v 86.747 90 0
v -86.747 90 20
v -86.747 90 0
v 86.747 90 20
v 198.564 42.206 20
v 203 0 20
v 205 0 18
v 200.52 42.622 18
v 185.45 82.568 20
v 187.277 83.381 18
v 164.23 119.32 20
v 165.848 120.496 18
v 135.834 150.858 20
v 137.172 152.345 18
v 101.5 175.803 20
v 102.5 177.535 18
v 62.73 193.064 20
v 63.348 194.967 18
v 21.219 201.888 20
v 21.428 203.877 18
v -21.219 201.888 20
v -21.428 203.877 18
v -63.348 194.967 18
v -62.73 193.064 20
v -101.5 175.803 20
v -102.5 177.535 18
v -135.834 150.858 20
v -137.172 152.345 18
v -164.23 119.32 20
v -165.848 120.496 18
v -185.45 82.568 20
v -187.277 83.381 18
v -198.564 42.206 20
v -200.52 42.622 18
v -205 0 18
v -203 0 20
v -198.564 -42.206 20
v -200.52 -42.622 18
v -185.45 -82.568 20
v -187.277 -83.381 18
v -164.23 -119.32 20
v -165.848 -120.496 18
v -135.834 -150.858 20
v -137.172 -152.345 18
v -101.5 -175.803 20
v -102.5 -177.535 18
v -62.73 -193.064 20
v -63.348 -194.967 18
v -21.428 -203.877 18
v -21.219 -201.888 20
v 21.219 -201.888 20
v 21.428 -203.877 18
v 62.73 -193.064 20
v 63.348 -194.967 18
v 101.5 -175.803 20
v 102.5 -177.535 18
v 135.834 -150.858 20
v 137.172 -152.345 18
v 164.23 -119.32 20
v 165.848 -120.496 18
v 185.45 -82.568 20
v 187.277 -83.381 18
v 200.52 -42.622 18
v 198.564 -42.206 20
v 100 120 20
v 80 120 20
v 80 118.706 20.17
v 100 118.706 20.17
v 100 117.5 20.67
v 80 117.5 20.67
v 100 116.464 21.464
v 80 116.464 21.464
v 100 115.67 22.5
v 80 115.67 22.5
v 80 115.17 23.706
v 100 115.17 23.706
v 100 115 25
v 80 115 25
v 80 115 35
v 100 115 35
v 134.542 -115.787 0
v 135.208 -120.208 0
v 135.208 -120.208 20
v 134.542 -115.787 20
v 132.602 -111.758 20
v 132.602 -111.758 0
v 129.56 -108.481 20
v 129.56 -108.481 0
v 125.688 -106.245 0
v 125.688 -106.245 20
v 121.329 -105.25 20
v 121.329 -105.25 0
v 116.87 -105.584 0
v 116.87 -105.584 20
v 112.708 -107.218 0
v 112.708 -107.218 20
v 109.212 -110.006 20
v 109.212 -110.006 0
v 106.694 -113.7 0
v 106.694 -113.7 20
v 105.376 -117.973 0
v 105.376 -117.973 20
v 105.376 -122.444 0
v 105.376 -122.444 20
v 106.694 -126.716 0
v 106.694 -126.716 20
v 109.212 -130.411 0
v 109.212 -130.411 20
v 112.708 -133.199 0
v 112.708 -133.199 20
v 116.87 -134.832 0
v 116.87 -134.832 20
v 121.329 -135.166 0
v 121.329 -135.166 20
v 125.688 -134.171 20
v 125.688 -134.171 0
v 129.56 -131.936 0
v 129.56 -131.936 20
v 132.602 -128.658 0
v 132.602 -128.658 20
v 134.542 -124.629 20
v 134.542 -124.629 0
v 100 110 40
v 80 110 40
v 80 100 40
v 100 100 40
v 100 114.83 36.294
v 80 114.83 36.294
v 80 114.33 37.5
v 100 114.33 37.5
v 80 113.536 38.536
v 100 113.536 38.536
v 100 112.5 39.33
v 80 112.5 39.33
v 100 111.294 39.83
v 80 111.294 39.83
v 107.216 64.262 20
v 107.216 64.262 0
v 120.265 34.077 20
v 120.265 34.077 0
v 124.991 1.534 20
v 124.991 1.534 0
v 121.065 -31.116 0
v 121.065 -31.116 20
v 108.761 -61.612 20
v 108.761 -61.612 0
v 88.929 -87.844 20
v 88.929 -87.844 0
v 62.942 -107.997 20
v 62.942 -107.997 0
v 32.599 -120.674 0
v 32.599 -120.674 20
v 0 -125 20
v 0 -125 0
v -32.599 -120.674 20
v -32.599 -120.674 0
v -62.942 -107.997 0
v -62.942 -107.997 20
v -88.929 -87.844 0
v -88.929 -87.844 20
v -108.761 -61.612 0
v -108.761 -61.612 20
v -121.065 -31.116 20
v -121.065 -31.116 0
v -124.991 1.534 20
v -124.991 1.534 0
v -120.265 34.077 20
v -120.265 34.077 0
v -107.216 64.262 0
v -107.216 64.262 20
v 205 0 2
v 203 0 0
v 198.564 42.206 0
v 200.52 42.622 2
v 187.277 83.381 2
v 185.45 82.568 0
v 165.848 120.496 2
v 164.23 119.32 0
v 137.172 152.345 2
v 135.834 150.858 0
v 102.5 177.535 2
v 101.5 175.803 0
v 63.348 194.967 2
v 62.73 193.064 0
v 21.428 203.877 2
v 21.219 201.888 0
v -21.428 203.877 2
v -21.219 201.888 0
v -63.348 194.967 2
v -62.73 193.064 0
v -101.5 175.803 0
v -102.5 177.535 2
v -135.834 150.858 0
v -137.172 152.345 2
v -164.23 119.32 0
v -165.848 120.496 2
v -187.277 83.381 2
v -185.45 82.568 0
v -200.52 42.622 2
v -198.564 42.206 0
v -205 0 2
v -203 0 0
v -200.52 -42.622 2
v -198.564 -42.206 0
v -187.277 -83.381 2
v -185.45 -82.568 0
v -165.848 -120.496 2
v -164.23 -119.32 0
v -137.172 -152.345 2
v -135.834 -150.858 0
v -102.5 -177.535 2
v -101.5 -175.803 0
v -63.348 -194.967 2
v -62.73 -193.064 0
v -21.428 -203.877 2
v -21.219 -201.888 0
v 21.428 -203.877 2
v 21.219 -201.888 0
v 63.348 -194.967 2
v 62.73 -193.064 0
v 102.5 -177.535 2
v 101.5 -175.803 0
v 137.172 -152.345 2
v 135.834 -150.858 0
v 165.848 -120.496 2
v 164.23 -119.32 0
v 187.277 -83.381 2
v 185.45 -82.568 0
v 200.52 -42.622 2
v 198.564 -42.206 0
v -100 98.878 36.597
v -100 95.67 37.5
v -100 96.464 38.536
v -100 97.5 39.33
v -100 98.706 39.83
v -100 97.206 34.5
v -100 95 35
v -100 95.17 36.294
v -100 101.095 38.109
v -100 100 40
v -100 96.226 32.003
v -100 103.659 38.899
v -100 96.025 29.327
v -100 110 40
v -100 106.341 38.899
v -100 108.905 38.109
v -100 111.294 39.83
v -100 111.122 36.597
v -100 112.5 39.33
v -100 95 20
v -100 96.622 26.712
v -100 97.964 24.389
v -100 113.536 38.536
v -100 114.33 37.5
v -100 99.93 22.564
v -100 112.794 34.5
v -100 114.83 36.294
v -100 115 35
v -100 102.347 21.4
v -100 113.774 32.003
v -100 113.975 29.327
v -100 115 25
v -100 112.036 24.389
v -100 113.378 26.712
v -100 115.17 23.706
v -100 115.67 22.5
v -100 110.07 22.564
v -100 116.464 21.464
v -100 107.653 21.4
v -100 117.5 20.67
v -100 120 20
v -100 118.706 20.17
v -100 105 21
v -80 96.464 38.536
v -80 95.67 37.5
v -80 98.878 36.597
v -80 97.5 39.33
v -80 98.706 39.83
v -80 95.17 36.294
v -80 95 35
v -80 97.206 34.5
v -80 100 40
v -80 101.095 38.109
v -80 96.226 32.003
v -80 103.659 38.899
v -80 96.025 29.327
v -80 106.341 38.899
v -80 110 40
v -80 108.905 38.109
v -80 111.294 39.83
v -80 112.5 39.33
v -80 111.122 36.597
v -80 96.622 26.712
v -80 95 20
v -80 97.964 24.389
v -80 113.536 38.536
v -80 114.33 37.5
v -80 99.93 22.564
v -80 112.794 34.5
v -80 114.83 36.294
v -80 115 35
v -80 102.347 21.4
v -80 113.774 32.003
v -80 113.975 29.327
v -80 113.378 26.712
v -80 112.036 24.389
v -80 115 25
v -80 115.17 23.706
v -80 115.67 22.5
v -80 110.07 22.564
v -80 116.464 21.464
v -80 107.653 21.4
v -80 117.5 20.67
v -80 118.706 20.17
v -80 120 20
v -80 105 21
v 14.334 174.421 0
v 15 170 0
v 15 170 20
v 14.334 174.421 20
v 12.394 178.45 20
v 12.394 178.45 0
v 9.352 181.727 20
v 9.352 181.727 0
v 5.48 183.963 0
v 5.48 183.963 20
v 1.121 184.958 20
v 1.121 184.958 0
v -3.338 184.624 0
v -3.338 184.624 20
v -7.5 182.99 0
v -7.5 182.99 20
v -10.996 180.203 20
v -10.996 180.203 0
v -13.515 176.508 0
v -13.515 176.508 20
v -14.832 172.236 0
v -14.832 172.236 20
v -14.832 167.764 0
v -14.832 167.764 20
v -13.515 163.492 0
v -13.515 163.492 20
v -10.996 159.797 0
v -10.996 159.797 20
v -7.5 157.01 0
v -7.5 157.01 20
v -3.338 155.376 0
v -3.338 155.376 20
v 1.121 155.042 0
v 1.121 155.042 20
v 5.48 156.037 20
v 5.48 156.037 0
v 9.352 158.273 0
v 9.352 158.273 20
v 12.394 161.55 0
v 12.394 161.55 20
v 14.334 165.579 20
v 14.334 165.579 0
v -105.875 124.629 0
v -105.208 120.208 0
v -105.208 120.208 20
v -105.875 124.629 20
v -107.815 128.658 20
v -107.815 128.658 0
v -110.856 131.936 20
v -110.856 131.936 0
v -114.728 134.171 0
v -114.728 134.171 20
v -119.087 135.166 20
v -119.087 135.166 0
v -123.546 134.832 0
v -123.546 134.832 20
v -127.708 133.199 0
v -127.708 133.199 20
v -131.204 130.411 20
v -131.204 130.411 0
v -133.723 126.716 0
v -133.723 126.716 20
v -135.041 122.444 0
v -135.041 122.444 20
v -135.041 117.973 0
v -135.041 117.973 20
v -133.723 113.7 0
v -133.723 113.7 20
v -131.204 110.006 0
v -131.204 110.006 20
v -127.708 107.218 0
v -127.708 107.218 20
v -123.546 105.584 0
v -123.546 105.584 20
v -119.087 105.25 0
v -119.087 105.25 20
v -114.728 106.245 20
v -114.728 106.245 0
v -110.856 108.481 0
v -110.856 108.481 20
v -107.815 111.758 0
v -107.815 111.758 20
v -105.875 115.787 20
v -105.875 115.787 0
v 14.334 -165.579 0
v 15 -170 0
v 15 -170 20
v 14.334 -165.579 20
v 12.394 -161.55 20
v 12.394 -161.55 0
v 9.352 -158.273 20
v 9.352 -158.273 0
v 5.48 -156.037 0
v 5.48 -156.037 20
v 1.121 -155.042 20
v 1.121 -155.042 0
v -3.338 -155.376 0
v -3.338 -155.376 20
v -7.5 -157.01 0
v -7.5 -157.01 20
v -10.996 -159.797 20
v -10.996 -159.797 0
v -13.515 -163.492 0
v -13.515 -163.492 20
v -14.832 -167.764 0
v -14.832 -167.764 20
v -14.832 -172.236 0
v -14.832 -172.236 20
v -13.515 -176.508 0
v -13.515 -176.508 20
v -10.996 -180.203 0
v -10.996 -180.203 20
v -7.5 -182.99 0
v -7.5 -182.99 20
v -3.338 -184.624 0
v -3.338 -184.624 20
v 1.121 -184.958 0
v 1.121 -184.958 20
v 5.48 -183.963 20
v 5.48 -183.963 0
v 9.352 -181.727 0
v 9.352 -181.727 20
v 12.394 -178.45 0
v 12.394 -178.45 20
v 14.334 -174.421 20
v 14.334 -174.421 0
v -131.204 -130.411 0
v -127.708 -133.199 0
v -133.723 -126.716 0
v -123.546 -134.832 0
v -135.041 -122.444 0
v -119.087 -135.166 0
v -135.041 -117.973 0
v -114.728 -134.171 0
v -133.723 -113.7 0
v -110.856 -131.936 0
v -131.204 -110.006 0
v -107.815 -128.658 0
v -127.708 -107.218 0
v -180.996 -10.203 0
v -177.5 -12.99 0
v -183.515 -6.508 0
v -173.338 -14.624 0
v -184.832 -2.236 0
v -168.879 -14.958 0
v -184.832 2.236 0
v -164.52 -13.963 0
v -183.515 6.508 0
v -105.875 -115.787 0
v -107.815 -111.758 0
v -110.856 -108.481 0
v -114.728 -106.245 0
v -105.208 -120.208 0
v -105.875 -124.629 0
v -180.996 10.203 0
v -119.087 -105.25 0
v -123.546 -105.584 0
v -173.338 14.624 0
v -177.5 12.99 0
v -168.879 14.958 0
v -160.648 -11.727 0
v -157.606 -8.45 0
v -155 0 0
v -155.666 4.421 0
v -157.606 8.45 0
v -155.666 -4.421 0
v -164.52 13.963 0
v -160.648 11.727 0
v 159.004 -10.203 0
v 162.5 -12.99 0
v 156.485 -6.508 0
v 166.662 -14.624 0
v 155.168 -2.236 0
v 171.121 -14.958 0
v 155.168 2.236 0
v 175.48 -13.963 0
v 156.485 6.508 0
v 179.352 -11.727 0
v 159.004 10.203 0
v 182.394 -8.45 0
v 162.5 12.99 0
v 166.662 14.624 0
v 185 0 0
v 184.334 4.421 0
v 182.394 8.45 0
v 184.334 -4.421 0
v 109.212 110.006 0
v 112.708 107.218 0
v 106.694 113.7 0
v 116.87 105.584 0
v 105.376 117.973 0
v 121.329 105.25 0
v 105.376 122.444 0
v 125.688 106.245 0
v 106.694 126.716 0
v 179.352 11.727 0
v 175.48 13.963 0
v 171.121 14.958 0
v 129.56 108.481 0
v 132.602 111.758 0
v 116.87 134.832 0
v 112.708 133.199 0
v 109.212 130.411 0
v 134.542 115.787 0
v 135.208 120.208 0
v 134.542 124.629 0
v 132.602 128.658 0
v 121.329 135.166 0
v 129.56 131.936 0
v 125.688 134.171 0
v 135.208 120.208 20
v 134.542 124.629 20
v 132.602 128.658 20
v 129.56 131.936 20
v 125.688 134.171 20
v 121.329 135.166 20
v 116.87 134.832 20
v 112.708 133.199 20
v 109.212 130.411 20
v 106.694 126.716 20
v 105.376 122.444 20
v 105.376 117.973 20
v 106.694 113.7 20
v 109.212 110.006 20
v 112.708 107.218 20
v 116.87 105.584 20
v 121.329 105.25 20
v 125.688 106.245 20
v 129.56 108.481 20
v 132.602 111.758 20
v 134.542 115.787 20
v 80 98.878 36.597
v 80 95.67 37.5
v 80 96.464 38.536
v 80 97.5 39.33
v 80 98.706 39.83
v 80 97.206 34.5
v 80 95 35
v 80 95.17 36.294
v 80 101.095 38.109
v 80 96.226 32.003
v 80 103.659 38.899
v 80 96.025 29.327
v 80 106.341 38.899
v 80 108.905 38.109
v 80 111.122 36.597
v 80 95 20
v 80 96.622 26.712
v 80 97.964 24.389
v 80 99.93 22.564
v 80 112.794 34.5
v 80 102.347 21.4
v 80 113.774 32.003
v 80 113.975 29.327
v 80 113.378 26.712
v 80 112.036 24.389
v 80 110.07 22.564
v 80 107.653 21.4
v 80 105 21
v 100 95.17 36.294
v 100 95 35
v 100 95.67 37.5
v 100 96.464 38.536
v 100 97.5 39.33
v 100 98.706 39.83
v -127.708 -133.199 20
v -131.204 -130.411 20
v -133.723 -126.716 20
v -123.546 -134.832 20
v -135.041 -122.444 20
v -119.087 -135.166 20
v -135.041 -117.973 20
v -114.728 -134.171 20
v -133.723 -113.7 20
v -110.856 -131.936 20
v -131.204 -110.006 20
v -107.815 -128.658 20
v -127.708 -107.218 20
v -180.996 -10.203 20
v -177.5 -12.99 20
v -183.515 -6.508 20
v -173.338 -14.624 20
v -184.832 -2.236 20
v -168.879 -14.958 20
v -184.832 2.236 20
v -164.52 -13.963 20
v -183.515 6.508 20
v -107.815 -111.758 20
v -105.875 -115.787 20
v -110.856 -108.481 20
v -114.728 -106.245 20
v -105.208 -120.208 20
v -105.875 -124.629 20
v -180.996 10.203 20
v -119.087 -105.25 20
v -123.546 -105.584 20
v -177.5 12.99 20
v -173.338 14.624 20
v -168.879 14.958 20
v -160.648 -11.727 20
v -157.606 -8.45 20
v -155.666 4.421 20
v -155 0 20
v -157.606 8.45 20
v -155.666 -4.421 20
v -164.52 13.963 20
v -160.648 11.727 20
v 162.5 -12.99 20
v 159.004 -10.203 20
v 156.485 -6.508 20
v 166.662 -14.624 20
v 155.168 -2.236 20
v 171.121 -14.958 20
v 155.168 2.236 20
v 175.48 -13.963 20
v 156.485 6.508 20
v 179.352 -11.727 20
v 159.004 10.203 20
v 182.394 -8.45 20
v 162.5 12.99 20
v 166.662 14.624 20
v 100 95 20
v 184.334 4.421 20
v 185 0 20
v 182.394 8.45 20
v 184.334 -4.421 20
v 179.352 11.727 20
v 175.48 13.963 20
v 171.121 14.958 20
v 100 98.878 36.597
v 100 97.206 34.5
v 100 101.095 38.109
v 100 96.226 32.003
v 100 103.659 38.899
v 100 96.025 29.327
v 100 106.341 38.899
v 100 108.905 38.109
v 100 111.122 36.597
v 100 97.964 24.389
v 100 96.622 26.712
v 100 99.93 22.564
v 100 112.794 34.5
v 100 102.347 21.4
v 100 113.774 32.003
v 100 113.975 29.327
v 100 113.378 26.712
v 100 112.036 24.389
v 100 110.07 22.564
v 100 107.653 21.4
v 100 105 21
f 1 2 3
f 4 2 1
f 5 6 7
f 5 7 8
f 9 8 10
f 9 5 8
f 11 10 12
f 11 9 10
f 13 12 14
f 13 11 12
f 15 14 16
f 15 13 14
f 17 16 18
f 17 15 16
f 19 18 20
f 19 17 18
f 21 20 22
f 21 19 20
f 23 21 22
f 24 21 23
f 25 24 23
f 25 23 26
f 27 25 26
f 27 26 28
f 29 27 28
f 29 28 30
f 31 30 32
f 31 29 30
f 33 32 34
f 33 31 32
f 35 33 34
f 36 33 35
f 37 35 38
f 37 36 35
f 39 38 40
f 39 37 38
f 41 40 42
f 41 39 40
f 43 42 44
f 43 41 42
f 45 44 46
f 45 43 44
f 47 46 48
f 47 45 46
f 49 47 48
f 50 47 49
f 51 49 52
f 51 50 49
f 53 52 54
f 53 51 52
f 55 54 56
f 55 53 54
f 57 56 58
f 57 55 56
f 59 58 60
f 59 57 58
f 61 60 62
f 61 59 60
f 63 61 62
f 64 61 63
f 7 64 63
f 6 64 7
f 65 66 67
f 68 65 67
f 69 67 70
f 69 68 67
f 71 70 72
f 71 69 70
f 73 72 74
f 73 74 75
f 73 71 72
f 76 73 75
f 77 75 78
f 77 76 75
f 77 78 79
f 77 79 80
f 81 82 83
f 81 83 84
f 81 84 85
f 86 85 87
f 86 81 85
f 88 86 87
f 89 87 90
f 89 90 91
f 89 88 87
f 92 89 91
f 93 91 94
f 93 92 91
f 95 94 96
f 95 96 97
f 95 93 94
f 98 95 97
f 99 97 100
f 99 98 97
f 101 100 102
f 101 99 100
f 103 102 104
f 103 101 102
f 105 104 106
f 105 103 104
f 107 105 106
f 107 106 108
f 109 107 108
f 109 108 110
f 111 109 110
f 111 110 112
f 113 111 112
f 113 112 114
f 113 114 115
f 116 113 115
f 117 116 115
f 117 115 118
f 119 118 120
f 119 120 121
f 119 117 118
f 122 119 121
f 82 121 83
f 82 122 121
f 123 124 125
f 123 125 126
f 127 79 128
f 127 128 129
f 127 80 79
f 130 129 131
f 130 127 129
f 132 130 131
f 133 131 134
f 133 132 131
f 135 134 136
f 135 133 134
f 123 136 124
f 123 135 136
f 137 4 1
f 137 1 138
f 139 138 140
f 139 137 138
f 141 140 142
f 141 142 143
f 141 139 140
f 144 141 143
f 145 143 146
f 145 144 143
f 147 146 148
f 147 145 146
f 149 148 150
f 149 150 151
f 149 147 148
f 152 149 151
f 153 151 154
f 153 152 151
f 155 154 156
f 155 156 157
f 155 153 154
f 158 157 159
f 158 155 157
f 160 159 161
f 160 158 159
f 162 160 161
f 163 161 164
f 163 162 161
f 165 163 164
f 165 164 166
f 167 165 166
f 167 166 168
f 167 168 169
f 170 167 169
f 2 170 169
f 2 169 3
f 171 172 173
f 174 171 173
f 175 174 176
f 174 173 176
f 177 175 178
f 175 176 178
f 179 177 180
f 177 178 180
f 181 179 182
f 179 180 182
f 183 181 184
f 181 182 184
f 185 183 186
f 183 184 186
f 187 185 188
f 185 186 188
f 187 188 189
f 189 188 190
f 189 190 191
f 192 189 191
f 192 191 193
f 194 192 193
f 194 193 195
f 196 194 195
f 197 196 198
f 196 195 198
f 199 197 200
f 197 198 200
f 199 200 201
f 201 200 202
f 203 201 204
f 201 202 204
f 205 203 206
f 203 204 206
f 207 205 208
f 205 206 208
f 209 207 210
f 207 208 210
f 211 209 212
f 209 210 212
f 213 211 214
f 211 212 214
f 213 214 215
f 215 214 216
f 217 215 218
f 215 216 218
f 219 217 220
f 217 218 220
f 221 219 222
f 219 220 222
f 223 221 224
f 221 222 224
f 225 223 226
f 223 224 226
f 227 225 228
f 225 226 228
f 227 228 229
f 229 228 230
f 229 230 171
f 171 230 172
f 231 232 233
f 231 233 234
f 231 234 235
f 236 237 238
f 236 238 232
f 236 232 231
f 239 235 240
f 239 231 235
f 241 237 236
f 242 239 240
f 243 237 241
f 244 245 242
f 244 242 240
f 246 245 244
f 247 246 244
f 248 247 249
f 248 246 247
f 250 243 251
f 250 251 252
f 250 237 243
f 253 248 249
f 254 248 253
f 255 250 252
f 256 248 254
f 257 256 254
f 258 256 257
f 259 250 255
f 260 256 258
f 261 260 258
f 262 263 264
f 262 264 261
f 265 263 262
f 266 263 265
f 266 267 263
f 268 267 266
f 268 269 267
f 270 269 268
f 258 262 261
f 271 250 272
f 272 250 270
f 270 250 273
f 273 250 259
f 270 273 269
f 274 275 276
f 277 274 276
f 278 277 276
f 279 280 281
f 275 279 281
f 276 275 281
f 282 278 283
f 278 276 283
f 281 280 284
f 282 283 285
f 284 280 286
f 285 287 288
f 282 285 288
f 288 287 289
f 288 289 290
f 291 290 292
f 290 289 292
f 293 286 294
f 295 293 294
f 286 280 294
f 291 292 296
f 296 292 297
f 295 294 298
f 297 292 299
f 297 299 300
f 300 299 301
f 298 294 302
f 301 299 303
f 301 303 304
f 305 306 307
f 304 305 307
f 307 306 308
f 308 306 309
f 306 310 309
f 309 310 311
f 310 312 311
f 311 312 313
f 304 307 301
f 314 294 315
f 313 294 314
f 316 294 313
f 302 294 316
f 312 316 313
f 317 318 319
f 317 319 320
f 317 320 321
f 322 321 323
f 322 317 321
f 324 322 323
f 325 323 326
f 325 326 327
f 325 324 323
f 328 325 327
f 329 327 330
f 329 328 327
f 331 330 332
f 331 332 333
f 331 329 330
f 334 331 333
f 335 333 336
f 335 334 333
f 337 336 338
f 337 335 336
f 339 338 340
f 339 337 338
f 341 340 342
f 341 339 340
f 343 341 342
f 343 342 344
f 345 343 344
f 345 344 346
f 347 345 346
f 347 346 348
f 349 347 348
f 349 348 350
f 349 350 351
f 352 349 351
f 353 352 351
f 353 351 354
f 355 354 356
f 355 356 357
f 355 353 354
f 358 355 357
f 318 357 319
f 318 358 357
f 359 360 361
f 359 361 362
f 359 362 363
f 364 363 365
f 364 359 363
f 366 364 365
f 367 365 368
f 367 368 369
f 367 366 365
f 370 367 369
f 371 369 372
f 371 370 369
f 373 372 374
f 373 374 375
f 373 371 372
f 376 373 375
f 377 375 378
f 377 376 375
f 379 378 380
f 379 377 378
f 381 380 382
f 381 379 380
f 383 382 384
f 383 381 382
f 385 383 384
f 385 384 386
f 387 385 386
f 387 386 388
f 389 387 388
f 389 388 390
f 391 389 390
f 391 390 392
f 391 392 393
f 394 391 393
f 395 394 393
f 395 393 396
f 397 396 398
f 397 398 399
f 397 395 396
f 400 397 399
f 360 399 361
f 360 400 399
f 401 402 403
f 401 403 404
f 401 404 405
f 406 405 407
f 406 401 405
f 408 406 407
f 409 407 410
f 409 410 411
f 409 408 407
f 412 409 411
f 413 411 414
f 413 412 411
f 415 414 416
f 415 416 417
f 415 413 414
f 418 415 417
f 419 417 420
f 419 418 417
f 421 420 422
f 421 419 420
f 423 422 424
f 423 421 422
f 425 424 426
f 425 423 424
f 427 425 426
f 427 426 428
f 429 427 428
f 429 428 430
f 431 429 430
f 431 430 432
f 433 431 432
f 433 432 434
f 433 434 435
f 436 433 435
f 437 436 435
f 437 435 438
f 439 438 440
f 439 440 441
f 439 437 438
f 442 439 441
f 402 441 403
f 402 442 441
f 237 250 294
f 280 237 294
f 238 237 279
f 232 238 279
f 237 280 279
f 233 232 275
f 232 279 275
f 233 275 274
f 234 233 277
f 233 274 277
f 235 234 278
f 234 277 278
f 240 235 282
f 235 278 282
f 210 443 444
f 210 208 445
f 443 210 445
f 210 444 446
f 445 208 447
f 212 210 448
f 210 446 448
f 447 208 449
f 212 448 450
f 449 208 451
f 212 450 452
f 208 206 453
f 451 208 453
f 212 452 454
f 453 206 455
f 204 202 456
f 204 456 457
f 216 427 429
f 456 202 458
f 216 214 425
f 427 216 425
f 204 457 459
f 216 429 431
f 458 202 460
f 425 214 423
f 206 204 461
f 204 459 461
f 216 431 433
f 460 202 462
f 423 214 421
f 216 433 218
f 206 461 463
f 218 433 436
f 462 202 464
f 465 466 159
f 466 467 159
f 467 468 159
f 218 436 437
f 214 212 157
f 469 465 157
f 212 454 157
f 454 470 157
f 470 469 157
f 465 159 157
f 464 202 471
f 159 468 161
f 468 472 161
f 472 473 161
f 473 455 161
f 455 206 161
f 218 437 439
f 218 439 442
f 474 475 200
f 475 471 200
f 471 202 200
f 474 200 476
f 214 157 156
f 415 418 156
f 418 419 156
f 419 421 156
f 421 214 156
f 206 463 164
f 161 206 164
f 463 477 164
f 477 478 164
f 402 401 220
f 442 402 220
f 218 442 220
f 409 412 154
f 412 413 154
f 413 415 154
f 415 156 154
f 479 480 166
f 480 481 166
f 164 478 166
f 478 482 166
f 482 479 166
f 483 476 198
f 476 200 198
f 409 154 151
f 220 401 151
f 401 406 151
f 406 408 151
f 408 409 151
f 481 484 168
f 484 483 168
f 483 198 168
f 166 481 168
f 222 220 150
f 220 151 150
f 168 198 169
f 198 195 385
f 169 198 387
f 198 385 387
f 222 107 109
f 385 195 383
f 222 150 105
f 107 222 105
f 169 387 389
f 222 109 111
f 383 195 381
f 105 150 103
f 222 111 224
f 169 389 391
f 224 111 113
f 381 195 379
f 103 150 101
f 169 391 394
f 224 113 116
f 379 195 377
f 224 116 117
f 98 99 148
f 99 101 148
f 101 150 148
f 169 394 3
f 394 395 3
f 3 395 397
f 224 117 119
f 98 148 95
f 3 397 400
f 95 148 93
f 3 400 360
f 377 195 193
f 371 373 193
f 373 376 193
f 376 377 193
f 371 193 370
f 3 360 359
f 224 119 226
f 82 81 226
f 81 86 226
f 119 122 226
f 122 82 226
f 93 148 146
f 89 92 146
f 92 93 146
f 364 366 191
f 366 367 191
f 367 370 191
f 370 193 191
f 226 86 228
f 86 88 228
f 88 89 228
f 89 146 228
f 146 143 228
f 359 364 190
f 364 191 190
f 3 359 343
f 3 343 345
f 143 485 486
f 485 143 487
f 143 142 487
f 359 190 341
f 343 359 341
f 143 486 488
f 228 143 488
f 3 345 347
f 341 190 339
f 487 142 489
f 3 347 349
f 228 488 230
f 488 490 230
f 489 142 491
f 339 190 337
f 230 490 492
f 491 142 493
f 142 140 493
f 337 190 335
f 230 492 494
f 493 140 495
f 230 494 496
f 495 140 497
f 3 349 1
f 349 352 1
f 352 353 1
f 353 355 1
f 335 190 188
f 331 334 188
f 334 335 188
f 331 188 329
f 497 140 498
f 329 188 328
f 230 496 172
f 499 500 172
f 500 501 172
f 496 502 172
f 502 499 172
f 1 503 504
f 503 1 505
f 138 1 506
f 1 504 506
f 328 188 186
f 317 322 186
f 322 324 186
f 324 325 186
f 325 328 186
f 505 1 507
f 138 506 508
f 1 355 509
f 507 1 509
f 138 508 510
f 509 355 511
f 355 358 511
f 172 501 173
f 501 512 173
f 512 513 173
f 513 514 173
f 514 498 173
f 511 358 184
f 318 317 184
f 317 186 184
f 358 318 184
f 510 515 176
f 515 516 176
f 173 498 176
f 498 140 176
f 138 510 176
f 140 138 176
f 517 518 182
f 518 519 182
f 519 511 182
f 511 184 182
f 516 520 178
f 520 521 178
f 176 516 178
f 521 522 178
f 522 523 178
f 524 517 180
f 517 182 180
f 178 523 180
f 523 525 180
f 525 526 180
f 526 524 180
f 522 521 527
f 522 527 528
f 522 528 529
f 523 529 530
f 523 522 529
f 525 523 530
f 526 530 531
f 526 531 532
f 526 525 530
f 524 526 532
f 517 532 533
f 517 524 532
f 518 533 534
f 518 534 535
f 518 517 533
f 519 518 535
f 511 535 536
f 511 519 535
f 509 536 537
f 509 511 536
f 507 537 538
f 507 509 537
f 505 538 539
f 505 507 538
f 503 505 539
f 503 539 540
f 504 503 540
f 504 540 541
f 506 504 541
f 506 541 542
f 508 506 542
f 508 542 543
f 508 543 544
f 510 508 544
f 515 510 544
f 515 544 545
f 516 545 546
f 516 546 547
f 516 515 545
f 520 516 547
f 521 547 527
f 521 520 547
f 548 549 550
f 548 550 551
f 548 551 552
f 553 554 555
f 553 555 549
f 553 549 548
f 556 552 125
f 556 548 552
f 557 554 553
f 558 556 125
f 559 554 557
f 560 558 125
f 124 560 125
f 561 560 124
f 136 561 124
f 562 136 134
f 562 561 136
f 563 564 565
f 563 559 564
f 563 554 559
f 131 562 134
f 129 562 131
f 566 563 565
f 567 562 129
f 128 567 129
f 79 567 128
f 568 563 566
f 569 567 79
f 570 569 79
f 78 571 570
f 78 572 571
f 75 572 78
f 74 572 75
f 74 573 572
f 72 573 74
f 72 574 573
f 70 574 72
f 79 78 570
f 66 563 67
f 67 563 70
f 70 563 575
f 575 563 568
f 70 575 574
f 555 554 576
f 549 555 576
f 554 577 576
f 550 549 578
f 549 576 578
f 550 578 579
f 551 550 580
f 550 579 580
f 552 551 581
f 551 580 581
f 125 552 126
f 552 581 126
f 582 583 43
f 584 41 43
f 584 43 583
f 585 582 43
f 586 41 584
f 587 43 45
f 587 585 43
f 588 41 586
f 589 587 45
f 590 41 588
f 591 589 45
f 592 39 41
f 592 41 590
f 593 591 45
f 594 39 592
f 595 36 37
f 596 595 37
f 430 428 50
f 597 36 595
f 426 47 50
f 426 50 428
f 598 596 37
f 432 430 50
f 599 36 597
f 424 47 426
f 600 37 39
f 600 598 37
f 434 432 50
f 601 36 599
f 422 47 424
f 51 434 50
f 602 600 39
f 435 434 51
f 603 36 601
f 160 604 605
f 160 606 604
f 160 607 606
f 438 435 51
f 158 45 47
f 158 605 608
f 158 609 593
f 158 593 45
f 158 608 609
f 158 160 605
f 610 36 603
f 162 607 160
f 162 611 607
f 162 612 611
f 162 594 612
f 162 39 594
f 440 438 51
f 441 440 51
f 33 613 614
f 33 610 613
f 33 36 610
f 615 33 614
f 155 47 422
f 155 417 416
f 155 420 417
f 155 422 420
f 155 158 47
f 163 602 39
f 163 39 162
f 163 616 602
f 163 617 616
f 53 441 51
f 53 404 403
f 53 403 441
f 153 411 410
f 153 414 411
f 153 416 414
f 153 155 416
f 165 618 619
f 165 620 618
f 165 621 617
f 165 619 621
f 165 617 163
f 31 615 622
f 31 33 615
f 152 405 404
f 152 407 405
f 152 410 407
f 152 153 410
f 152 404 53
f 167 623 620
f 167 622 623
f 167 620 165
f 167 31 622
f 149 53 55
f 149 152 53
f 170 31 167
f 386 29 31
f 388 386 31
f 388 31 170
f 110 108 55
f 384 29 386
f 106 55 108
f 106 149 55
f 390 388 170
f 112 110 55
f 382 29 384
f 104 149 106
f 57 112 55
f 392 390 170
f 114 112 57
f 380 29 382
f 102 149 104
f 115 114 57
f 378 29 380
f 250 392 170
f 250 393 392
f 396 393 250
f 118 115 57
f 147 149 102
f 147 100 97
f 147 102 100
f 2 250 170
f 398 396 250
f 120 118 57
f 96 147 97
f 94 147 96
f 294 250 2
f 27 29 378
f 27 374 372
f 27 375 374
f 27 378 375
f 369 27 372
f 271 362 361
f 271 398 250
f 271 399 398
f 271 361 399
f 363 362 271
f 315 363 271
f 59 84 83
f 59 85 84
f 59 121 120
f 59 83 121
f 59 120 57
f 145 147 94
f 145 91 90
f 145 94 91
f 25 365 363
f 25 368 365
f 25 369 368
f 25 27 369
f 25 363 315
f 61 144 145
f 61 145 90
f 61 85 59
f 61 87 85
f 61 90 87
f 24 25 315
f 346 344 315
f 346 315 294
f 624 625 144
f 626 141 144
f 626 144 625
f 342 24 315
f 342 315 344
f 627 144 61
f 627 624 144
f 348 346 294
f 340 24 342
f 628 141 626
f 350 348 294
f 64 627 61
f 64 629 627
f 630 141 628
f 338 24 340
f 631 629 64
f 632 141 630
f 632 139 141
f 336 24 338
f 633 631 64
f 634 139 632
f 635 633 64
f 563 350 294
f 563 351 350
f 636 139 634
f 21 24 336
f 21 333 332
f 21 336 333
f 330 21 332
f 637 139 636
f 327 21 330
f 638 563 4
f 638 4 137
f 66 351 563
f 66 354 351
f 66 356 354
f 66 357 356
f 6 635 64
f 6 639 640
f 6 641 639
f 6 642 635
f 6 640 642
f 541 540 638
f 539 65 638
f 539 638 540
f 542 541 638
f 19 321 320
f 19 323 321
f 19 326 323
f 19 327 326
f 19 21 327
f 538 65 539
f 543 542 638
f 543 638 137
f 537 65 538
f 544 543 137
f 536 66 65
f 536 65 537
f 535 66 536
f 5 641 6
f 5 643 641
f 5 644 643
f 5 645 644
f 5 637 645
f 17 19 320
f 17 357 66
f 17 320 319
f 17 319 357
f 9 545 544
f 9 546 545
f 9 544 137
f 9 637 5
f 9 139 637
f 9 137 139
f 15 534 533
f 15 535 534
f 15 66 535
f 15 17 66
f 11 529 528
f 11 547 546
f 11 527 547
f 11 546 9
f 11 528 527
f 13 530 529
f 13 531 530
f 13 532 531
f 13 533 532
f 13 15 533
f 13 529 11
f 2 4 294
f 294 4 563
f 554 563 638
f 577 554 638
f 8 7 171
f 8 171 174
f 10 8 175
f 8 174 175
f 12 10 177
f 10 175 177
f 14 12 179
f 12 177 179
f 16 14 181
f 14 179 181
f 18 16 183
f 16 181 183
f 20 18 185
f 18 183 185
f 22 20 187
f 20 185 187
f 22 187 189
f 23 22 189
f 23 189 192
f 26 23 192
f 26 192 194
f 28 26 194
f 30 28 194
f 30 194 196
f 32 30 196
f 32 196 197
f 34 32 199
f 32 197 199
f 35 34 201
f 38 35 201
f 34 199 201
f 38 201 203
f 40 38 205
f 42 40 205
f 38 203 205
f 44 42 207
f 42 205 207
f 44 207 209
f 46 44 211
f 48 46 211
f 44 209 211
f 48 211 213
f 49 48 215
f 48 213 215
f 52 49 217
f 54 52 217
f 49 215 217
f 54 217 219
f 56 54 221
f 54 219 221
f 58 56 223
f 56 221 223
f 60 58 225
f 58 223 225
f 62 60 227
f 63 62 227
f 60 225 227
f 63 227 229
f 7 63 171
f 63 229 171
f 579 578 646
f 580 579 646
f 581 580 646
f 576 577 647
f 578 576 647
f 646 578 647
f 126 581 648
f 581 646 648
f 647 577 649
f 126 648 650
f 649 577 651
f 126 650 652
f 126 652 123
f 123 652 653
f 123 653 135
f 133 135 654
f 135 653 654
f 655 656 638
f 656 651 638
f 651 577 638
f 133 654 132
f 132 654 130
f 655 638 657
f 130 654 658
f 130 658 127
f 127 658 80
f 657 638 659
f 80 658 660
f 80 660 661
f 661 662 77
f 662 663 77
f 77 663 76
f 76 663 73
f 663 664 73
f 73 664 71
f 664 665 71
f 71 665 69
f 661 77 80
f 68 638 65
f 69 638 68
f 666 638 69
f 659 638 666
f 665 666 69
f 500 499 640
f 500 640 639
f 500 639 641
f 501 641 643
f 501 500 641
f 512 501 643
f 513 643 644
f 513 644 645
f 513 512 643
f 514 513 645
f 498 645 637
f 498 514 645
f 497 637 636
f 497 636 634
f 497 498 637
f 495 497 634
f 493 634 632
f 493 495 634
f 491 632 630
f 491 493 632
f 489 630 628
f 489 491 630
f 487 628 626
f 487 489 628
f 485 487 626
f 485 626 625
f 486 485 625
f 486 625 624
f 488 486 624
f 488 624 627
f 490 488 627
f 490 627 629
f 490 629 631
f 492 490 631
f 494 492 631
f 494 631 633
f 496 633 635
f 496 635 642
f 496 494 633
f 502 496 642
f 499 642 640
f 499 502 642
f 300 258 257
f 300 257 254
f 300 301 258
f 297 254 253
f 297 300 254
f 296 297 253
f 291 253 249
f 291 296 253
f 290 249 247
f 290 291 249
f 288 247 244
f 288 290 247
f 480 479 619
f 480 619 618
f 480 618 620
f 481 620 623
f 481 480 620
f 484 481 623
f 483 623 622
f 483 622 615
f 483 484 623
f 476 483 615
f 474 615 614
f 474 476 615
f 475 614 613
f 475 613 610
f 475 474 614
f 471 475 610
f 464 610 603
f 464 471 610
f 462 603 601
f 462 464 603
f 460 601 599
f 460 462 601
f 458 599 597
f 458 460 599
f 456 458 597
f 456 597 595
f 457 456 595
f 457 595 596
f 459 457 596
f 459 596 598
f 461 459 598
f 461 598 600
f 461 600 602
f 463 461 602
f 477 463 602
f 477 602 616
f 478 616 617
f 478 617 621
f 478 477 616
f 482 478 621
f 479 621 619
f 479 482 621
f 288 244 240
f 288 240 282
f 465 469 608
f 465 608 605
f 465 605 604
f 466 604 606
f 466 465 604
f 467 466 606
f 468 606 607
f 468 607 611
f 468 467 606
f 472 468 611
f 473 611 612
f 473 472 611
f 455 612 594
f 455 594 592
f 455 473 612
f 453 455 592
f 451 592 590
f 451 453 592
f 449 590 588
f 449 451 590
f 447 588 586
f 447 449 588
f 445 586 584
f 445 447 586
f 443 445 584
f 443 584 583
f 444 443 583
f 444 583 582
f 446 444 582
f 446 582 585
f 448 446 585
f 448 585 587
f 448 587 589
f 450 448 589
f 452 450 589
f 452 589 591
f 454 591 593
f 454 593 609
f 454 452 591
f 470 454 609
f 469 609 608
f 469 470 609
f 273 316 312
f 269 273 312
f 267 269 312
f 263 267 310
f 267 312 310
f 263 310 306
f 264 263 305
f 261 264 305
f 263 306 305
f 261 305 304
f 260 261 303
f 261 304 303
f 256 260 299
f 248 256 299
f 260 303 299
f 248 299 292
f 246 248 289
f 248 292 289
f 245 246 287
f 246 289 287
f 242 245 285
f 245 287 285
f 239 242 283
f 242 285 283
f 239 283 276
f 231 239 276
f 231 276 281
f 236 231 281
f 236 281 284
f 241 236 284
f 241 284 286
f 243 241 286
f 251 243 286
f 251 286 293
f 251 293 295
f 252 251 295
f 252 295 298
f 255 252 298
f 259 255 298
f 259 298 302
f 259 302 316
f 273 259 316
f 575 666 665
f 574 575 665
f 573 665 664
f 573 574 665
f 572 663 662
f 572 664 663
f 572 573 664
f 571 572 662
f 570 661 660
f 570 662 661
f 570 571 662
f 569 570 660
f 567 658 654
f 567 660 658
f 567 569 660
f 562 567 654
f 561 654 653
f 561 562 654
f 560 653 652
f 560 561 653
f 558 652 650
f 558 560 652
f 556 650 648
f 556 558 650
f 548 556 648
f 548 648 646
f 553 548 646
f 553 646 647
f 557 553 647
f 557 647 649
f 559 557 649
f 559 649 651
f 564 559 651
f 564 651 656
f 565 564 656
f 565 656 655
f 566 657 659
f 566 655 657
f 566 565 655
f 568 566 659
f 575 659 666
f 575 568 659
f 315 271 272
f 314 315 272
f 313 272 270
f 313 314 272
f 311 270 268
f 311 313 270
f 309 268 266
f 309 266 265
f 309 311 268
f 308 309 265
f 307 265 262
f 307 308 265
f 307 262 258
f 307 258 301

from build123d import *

# Parameters (mm, degrees)
SKETCH1_R                      = 205
SKETCH1_R_2                    = 15
BOSS_EXTRUDE1_DEPTH            = 20
CHAMFER1_SIZE                  = 2
CUT_EXTRUDE1_DEPTH             = 20
SKETCH4_W                      = 20
SKETCH4_H                      = 20
BOSS_EXTRUDE2_DEPTH            = 20
CUT_EXTRUDE3_REACH             = 294.66
SKETCH5_R                      = 9
CUT_EXTRUDE3_DIRECTION_2_REACH = 294.66
FILLET1_R                      = 5


with BuildPart() as part:
    # Sketch1 → Boss-Extrude1 (new body)
    with BuildSketch(Plane.XY):
        Circle(SKETCH1_R)
        with Locations((0, 170)):
            Circle(SKETCH1_R_2, mode=Mode.SUBTRACT)
        with Locations((120.208152802, 120.208152802)):
            Circle(SKETCH1_R_2, mode=Mode.SUBTRACT)
        with Locations((170, 0)):
            Circle(SKETCH1_R_2, mode=Mode.SUBTRACT)
        with Locations((120.208152802, -120.208152802)):
            Circle(SKETCH1_R_2, mode=Mode.SUBTRACT)
        with Locations((0, -170)):
            Circle(SKETCH1_R_2, mode=Mode.SUBTRACT)
        with Locations((-120.208152802, -120.208152802)):
            Circle(SKETCH1_R_2, mode=Mode.SUBTRACT)
        with Locations((-170, 0)):
            Circle(SKETCH1_R_2, mode=Mode.SUBTRACT)
        with Locations((-120.208152802, 120.208152802)):
            Circle(SKETCH1_R_2, mode=Mode.SUBTRACT)
    extrude(amount=BOSS_EXTRUDE1_DEPTH)

    # Chamfer1
    chamfer1_edges = [part.edges().sort_by_distance(p)[0] for p in [
        (-205, 0, 0),
        (-205, 0, 20),
    ]]
    chamfer(chamfer1_edges, length=CHAMFER1_SIZE)

    # Sketch2 → Cut-Extrude1 (cut)
    with BuildSketch(Plane.XY.offset(20)):
        with BuildLine():
            Line((-86.746757864, 90), (86.746757864, 90))
            ThreePointArc((86.746757864, 90), (0, -125), (-86.746757864, 90))
        make_face()
    extrude(amount=-CUT_EXTRUDE1_DEPTH, mode=Mode.SUBTRACT)

    # Sketch4 → Boss-Extrude2 (add)
    with BuildSketch(Plane.XY.offset(20)):
        with Locations((-90, 105)):
            Rectangle(SKETCH4_W, SKETCH4_H)
        with Locations((90, 105)):
            Rectangle(SKETCH4_W, SKETCH4_H)
    extrude(amount=BOSS_EXTRUDE2_DEPTH)

    # Cut-Extrude3: up to this face of the body (flat: up to its plane)
    cut_extrude3_end = Plane(part.part.faces().sort_by_distance((-100, 105, 30))[0])
    # Sketch5 → Cut-Extrude3 (cut, up to the picked face)
    with BuildSketch(Plane(origin=(0, 0, 0), x_dir=(0, 0, -1), z_dir=(1, 0, 0)), mode=Mode.PRIVATE) as cut_extrude3_sk1:
        with Locations((-30, 105)):
            Circle(SKETCH5_R)
    cut_extrude3_tool1 = split(extrude(cut_extrude3_sk1.sketch, amount=-CUT_EXTRUDE3_REACH, mode=Mode.PRIVATE), bisect_by=cut_extrude3_end, keep=Keep.BOTH, mode=Mode.PRIVATE)
    add(cut_extrude3_tool1.solids().sort_by(Axis((0, 105, 30), (-1, 0, 0)))[0], mode=Mode.SUBTRACT)

    # Cut-Extrude3 direction 2: up to this face of the body (flat: up to its plane)
    cut_extrude3_direction_2_end = Plane(part.part.faces().sort_by_distance((100, 105, 30))[0])
    # Sketch5 → Cut-Extrude3 direction 2 (cut, up to the picked face)
    with BuildSketch(Plane(origin=(0, 0, 0), x_dir=(0, 0, -1), z_dir=(1, 0, 0)), mode=Mode.PRIVATE) as cut_extrude3_direction_2_sk1:
        with Locations((-30, 105)):
            Circle(SKETCH5_R)
    cut_extrude3_direction_2_tool1 = split(extrude(cut_extrude3_direction_2_sk1.sketch, amount=CUT_EXTRUDE3_DIRECTION_2_REACH, mode=Mode.PRIVATE), bisect_by=cut_extrude3_direction_2_end, keep=Keep.BOTH, mode=Mode.PRIVATE)
    add(cut_extrude3_direction_2_tool1.solids().sort_by(Axis((0, 105, 30), (1, 0, 0)))[0], mode=Mode.SUBTRACT)

    # Fillet1
    fillet1_edges = [part.edges().sort_by_distance(p)[0] for p in [
        (-90, 115, 20),
        (-90, 95, 40),
        (-90, 115, 40),
        (90, 115, 20),
        (90, 115, 40),
        (90, 95, 40),
    ]]
    fillet(fillet1_edges, radius=FILLET1_R)


solid = part.part
